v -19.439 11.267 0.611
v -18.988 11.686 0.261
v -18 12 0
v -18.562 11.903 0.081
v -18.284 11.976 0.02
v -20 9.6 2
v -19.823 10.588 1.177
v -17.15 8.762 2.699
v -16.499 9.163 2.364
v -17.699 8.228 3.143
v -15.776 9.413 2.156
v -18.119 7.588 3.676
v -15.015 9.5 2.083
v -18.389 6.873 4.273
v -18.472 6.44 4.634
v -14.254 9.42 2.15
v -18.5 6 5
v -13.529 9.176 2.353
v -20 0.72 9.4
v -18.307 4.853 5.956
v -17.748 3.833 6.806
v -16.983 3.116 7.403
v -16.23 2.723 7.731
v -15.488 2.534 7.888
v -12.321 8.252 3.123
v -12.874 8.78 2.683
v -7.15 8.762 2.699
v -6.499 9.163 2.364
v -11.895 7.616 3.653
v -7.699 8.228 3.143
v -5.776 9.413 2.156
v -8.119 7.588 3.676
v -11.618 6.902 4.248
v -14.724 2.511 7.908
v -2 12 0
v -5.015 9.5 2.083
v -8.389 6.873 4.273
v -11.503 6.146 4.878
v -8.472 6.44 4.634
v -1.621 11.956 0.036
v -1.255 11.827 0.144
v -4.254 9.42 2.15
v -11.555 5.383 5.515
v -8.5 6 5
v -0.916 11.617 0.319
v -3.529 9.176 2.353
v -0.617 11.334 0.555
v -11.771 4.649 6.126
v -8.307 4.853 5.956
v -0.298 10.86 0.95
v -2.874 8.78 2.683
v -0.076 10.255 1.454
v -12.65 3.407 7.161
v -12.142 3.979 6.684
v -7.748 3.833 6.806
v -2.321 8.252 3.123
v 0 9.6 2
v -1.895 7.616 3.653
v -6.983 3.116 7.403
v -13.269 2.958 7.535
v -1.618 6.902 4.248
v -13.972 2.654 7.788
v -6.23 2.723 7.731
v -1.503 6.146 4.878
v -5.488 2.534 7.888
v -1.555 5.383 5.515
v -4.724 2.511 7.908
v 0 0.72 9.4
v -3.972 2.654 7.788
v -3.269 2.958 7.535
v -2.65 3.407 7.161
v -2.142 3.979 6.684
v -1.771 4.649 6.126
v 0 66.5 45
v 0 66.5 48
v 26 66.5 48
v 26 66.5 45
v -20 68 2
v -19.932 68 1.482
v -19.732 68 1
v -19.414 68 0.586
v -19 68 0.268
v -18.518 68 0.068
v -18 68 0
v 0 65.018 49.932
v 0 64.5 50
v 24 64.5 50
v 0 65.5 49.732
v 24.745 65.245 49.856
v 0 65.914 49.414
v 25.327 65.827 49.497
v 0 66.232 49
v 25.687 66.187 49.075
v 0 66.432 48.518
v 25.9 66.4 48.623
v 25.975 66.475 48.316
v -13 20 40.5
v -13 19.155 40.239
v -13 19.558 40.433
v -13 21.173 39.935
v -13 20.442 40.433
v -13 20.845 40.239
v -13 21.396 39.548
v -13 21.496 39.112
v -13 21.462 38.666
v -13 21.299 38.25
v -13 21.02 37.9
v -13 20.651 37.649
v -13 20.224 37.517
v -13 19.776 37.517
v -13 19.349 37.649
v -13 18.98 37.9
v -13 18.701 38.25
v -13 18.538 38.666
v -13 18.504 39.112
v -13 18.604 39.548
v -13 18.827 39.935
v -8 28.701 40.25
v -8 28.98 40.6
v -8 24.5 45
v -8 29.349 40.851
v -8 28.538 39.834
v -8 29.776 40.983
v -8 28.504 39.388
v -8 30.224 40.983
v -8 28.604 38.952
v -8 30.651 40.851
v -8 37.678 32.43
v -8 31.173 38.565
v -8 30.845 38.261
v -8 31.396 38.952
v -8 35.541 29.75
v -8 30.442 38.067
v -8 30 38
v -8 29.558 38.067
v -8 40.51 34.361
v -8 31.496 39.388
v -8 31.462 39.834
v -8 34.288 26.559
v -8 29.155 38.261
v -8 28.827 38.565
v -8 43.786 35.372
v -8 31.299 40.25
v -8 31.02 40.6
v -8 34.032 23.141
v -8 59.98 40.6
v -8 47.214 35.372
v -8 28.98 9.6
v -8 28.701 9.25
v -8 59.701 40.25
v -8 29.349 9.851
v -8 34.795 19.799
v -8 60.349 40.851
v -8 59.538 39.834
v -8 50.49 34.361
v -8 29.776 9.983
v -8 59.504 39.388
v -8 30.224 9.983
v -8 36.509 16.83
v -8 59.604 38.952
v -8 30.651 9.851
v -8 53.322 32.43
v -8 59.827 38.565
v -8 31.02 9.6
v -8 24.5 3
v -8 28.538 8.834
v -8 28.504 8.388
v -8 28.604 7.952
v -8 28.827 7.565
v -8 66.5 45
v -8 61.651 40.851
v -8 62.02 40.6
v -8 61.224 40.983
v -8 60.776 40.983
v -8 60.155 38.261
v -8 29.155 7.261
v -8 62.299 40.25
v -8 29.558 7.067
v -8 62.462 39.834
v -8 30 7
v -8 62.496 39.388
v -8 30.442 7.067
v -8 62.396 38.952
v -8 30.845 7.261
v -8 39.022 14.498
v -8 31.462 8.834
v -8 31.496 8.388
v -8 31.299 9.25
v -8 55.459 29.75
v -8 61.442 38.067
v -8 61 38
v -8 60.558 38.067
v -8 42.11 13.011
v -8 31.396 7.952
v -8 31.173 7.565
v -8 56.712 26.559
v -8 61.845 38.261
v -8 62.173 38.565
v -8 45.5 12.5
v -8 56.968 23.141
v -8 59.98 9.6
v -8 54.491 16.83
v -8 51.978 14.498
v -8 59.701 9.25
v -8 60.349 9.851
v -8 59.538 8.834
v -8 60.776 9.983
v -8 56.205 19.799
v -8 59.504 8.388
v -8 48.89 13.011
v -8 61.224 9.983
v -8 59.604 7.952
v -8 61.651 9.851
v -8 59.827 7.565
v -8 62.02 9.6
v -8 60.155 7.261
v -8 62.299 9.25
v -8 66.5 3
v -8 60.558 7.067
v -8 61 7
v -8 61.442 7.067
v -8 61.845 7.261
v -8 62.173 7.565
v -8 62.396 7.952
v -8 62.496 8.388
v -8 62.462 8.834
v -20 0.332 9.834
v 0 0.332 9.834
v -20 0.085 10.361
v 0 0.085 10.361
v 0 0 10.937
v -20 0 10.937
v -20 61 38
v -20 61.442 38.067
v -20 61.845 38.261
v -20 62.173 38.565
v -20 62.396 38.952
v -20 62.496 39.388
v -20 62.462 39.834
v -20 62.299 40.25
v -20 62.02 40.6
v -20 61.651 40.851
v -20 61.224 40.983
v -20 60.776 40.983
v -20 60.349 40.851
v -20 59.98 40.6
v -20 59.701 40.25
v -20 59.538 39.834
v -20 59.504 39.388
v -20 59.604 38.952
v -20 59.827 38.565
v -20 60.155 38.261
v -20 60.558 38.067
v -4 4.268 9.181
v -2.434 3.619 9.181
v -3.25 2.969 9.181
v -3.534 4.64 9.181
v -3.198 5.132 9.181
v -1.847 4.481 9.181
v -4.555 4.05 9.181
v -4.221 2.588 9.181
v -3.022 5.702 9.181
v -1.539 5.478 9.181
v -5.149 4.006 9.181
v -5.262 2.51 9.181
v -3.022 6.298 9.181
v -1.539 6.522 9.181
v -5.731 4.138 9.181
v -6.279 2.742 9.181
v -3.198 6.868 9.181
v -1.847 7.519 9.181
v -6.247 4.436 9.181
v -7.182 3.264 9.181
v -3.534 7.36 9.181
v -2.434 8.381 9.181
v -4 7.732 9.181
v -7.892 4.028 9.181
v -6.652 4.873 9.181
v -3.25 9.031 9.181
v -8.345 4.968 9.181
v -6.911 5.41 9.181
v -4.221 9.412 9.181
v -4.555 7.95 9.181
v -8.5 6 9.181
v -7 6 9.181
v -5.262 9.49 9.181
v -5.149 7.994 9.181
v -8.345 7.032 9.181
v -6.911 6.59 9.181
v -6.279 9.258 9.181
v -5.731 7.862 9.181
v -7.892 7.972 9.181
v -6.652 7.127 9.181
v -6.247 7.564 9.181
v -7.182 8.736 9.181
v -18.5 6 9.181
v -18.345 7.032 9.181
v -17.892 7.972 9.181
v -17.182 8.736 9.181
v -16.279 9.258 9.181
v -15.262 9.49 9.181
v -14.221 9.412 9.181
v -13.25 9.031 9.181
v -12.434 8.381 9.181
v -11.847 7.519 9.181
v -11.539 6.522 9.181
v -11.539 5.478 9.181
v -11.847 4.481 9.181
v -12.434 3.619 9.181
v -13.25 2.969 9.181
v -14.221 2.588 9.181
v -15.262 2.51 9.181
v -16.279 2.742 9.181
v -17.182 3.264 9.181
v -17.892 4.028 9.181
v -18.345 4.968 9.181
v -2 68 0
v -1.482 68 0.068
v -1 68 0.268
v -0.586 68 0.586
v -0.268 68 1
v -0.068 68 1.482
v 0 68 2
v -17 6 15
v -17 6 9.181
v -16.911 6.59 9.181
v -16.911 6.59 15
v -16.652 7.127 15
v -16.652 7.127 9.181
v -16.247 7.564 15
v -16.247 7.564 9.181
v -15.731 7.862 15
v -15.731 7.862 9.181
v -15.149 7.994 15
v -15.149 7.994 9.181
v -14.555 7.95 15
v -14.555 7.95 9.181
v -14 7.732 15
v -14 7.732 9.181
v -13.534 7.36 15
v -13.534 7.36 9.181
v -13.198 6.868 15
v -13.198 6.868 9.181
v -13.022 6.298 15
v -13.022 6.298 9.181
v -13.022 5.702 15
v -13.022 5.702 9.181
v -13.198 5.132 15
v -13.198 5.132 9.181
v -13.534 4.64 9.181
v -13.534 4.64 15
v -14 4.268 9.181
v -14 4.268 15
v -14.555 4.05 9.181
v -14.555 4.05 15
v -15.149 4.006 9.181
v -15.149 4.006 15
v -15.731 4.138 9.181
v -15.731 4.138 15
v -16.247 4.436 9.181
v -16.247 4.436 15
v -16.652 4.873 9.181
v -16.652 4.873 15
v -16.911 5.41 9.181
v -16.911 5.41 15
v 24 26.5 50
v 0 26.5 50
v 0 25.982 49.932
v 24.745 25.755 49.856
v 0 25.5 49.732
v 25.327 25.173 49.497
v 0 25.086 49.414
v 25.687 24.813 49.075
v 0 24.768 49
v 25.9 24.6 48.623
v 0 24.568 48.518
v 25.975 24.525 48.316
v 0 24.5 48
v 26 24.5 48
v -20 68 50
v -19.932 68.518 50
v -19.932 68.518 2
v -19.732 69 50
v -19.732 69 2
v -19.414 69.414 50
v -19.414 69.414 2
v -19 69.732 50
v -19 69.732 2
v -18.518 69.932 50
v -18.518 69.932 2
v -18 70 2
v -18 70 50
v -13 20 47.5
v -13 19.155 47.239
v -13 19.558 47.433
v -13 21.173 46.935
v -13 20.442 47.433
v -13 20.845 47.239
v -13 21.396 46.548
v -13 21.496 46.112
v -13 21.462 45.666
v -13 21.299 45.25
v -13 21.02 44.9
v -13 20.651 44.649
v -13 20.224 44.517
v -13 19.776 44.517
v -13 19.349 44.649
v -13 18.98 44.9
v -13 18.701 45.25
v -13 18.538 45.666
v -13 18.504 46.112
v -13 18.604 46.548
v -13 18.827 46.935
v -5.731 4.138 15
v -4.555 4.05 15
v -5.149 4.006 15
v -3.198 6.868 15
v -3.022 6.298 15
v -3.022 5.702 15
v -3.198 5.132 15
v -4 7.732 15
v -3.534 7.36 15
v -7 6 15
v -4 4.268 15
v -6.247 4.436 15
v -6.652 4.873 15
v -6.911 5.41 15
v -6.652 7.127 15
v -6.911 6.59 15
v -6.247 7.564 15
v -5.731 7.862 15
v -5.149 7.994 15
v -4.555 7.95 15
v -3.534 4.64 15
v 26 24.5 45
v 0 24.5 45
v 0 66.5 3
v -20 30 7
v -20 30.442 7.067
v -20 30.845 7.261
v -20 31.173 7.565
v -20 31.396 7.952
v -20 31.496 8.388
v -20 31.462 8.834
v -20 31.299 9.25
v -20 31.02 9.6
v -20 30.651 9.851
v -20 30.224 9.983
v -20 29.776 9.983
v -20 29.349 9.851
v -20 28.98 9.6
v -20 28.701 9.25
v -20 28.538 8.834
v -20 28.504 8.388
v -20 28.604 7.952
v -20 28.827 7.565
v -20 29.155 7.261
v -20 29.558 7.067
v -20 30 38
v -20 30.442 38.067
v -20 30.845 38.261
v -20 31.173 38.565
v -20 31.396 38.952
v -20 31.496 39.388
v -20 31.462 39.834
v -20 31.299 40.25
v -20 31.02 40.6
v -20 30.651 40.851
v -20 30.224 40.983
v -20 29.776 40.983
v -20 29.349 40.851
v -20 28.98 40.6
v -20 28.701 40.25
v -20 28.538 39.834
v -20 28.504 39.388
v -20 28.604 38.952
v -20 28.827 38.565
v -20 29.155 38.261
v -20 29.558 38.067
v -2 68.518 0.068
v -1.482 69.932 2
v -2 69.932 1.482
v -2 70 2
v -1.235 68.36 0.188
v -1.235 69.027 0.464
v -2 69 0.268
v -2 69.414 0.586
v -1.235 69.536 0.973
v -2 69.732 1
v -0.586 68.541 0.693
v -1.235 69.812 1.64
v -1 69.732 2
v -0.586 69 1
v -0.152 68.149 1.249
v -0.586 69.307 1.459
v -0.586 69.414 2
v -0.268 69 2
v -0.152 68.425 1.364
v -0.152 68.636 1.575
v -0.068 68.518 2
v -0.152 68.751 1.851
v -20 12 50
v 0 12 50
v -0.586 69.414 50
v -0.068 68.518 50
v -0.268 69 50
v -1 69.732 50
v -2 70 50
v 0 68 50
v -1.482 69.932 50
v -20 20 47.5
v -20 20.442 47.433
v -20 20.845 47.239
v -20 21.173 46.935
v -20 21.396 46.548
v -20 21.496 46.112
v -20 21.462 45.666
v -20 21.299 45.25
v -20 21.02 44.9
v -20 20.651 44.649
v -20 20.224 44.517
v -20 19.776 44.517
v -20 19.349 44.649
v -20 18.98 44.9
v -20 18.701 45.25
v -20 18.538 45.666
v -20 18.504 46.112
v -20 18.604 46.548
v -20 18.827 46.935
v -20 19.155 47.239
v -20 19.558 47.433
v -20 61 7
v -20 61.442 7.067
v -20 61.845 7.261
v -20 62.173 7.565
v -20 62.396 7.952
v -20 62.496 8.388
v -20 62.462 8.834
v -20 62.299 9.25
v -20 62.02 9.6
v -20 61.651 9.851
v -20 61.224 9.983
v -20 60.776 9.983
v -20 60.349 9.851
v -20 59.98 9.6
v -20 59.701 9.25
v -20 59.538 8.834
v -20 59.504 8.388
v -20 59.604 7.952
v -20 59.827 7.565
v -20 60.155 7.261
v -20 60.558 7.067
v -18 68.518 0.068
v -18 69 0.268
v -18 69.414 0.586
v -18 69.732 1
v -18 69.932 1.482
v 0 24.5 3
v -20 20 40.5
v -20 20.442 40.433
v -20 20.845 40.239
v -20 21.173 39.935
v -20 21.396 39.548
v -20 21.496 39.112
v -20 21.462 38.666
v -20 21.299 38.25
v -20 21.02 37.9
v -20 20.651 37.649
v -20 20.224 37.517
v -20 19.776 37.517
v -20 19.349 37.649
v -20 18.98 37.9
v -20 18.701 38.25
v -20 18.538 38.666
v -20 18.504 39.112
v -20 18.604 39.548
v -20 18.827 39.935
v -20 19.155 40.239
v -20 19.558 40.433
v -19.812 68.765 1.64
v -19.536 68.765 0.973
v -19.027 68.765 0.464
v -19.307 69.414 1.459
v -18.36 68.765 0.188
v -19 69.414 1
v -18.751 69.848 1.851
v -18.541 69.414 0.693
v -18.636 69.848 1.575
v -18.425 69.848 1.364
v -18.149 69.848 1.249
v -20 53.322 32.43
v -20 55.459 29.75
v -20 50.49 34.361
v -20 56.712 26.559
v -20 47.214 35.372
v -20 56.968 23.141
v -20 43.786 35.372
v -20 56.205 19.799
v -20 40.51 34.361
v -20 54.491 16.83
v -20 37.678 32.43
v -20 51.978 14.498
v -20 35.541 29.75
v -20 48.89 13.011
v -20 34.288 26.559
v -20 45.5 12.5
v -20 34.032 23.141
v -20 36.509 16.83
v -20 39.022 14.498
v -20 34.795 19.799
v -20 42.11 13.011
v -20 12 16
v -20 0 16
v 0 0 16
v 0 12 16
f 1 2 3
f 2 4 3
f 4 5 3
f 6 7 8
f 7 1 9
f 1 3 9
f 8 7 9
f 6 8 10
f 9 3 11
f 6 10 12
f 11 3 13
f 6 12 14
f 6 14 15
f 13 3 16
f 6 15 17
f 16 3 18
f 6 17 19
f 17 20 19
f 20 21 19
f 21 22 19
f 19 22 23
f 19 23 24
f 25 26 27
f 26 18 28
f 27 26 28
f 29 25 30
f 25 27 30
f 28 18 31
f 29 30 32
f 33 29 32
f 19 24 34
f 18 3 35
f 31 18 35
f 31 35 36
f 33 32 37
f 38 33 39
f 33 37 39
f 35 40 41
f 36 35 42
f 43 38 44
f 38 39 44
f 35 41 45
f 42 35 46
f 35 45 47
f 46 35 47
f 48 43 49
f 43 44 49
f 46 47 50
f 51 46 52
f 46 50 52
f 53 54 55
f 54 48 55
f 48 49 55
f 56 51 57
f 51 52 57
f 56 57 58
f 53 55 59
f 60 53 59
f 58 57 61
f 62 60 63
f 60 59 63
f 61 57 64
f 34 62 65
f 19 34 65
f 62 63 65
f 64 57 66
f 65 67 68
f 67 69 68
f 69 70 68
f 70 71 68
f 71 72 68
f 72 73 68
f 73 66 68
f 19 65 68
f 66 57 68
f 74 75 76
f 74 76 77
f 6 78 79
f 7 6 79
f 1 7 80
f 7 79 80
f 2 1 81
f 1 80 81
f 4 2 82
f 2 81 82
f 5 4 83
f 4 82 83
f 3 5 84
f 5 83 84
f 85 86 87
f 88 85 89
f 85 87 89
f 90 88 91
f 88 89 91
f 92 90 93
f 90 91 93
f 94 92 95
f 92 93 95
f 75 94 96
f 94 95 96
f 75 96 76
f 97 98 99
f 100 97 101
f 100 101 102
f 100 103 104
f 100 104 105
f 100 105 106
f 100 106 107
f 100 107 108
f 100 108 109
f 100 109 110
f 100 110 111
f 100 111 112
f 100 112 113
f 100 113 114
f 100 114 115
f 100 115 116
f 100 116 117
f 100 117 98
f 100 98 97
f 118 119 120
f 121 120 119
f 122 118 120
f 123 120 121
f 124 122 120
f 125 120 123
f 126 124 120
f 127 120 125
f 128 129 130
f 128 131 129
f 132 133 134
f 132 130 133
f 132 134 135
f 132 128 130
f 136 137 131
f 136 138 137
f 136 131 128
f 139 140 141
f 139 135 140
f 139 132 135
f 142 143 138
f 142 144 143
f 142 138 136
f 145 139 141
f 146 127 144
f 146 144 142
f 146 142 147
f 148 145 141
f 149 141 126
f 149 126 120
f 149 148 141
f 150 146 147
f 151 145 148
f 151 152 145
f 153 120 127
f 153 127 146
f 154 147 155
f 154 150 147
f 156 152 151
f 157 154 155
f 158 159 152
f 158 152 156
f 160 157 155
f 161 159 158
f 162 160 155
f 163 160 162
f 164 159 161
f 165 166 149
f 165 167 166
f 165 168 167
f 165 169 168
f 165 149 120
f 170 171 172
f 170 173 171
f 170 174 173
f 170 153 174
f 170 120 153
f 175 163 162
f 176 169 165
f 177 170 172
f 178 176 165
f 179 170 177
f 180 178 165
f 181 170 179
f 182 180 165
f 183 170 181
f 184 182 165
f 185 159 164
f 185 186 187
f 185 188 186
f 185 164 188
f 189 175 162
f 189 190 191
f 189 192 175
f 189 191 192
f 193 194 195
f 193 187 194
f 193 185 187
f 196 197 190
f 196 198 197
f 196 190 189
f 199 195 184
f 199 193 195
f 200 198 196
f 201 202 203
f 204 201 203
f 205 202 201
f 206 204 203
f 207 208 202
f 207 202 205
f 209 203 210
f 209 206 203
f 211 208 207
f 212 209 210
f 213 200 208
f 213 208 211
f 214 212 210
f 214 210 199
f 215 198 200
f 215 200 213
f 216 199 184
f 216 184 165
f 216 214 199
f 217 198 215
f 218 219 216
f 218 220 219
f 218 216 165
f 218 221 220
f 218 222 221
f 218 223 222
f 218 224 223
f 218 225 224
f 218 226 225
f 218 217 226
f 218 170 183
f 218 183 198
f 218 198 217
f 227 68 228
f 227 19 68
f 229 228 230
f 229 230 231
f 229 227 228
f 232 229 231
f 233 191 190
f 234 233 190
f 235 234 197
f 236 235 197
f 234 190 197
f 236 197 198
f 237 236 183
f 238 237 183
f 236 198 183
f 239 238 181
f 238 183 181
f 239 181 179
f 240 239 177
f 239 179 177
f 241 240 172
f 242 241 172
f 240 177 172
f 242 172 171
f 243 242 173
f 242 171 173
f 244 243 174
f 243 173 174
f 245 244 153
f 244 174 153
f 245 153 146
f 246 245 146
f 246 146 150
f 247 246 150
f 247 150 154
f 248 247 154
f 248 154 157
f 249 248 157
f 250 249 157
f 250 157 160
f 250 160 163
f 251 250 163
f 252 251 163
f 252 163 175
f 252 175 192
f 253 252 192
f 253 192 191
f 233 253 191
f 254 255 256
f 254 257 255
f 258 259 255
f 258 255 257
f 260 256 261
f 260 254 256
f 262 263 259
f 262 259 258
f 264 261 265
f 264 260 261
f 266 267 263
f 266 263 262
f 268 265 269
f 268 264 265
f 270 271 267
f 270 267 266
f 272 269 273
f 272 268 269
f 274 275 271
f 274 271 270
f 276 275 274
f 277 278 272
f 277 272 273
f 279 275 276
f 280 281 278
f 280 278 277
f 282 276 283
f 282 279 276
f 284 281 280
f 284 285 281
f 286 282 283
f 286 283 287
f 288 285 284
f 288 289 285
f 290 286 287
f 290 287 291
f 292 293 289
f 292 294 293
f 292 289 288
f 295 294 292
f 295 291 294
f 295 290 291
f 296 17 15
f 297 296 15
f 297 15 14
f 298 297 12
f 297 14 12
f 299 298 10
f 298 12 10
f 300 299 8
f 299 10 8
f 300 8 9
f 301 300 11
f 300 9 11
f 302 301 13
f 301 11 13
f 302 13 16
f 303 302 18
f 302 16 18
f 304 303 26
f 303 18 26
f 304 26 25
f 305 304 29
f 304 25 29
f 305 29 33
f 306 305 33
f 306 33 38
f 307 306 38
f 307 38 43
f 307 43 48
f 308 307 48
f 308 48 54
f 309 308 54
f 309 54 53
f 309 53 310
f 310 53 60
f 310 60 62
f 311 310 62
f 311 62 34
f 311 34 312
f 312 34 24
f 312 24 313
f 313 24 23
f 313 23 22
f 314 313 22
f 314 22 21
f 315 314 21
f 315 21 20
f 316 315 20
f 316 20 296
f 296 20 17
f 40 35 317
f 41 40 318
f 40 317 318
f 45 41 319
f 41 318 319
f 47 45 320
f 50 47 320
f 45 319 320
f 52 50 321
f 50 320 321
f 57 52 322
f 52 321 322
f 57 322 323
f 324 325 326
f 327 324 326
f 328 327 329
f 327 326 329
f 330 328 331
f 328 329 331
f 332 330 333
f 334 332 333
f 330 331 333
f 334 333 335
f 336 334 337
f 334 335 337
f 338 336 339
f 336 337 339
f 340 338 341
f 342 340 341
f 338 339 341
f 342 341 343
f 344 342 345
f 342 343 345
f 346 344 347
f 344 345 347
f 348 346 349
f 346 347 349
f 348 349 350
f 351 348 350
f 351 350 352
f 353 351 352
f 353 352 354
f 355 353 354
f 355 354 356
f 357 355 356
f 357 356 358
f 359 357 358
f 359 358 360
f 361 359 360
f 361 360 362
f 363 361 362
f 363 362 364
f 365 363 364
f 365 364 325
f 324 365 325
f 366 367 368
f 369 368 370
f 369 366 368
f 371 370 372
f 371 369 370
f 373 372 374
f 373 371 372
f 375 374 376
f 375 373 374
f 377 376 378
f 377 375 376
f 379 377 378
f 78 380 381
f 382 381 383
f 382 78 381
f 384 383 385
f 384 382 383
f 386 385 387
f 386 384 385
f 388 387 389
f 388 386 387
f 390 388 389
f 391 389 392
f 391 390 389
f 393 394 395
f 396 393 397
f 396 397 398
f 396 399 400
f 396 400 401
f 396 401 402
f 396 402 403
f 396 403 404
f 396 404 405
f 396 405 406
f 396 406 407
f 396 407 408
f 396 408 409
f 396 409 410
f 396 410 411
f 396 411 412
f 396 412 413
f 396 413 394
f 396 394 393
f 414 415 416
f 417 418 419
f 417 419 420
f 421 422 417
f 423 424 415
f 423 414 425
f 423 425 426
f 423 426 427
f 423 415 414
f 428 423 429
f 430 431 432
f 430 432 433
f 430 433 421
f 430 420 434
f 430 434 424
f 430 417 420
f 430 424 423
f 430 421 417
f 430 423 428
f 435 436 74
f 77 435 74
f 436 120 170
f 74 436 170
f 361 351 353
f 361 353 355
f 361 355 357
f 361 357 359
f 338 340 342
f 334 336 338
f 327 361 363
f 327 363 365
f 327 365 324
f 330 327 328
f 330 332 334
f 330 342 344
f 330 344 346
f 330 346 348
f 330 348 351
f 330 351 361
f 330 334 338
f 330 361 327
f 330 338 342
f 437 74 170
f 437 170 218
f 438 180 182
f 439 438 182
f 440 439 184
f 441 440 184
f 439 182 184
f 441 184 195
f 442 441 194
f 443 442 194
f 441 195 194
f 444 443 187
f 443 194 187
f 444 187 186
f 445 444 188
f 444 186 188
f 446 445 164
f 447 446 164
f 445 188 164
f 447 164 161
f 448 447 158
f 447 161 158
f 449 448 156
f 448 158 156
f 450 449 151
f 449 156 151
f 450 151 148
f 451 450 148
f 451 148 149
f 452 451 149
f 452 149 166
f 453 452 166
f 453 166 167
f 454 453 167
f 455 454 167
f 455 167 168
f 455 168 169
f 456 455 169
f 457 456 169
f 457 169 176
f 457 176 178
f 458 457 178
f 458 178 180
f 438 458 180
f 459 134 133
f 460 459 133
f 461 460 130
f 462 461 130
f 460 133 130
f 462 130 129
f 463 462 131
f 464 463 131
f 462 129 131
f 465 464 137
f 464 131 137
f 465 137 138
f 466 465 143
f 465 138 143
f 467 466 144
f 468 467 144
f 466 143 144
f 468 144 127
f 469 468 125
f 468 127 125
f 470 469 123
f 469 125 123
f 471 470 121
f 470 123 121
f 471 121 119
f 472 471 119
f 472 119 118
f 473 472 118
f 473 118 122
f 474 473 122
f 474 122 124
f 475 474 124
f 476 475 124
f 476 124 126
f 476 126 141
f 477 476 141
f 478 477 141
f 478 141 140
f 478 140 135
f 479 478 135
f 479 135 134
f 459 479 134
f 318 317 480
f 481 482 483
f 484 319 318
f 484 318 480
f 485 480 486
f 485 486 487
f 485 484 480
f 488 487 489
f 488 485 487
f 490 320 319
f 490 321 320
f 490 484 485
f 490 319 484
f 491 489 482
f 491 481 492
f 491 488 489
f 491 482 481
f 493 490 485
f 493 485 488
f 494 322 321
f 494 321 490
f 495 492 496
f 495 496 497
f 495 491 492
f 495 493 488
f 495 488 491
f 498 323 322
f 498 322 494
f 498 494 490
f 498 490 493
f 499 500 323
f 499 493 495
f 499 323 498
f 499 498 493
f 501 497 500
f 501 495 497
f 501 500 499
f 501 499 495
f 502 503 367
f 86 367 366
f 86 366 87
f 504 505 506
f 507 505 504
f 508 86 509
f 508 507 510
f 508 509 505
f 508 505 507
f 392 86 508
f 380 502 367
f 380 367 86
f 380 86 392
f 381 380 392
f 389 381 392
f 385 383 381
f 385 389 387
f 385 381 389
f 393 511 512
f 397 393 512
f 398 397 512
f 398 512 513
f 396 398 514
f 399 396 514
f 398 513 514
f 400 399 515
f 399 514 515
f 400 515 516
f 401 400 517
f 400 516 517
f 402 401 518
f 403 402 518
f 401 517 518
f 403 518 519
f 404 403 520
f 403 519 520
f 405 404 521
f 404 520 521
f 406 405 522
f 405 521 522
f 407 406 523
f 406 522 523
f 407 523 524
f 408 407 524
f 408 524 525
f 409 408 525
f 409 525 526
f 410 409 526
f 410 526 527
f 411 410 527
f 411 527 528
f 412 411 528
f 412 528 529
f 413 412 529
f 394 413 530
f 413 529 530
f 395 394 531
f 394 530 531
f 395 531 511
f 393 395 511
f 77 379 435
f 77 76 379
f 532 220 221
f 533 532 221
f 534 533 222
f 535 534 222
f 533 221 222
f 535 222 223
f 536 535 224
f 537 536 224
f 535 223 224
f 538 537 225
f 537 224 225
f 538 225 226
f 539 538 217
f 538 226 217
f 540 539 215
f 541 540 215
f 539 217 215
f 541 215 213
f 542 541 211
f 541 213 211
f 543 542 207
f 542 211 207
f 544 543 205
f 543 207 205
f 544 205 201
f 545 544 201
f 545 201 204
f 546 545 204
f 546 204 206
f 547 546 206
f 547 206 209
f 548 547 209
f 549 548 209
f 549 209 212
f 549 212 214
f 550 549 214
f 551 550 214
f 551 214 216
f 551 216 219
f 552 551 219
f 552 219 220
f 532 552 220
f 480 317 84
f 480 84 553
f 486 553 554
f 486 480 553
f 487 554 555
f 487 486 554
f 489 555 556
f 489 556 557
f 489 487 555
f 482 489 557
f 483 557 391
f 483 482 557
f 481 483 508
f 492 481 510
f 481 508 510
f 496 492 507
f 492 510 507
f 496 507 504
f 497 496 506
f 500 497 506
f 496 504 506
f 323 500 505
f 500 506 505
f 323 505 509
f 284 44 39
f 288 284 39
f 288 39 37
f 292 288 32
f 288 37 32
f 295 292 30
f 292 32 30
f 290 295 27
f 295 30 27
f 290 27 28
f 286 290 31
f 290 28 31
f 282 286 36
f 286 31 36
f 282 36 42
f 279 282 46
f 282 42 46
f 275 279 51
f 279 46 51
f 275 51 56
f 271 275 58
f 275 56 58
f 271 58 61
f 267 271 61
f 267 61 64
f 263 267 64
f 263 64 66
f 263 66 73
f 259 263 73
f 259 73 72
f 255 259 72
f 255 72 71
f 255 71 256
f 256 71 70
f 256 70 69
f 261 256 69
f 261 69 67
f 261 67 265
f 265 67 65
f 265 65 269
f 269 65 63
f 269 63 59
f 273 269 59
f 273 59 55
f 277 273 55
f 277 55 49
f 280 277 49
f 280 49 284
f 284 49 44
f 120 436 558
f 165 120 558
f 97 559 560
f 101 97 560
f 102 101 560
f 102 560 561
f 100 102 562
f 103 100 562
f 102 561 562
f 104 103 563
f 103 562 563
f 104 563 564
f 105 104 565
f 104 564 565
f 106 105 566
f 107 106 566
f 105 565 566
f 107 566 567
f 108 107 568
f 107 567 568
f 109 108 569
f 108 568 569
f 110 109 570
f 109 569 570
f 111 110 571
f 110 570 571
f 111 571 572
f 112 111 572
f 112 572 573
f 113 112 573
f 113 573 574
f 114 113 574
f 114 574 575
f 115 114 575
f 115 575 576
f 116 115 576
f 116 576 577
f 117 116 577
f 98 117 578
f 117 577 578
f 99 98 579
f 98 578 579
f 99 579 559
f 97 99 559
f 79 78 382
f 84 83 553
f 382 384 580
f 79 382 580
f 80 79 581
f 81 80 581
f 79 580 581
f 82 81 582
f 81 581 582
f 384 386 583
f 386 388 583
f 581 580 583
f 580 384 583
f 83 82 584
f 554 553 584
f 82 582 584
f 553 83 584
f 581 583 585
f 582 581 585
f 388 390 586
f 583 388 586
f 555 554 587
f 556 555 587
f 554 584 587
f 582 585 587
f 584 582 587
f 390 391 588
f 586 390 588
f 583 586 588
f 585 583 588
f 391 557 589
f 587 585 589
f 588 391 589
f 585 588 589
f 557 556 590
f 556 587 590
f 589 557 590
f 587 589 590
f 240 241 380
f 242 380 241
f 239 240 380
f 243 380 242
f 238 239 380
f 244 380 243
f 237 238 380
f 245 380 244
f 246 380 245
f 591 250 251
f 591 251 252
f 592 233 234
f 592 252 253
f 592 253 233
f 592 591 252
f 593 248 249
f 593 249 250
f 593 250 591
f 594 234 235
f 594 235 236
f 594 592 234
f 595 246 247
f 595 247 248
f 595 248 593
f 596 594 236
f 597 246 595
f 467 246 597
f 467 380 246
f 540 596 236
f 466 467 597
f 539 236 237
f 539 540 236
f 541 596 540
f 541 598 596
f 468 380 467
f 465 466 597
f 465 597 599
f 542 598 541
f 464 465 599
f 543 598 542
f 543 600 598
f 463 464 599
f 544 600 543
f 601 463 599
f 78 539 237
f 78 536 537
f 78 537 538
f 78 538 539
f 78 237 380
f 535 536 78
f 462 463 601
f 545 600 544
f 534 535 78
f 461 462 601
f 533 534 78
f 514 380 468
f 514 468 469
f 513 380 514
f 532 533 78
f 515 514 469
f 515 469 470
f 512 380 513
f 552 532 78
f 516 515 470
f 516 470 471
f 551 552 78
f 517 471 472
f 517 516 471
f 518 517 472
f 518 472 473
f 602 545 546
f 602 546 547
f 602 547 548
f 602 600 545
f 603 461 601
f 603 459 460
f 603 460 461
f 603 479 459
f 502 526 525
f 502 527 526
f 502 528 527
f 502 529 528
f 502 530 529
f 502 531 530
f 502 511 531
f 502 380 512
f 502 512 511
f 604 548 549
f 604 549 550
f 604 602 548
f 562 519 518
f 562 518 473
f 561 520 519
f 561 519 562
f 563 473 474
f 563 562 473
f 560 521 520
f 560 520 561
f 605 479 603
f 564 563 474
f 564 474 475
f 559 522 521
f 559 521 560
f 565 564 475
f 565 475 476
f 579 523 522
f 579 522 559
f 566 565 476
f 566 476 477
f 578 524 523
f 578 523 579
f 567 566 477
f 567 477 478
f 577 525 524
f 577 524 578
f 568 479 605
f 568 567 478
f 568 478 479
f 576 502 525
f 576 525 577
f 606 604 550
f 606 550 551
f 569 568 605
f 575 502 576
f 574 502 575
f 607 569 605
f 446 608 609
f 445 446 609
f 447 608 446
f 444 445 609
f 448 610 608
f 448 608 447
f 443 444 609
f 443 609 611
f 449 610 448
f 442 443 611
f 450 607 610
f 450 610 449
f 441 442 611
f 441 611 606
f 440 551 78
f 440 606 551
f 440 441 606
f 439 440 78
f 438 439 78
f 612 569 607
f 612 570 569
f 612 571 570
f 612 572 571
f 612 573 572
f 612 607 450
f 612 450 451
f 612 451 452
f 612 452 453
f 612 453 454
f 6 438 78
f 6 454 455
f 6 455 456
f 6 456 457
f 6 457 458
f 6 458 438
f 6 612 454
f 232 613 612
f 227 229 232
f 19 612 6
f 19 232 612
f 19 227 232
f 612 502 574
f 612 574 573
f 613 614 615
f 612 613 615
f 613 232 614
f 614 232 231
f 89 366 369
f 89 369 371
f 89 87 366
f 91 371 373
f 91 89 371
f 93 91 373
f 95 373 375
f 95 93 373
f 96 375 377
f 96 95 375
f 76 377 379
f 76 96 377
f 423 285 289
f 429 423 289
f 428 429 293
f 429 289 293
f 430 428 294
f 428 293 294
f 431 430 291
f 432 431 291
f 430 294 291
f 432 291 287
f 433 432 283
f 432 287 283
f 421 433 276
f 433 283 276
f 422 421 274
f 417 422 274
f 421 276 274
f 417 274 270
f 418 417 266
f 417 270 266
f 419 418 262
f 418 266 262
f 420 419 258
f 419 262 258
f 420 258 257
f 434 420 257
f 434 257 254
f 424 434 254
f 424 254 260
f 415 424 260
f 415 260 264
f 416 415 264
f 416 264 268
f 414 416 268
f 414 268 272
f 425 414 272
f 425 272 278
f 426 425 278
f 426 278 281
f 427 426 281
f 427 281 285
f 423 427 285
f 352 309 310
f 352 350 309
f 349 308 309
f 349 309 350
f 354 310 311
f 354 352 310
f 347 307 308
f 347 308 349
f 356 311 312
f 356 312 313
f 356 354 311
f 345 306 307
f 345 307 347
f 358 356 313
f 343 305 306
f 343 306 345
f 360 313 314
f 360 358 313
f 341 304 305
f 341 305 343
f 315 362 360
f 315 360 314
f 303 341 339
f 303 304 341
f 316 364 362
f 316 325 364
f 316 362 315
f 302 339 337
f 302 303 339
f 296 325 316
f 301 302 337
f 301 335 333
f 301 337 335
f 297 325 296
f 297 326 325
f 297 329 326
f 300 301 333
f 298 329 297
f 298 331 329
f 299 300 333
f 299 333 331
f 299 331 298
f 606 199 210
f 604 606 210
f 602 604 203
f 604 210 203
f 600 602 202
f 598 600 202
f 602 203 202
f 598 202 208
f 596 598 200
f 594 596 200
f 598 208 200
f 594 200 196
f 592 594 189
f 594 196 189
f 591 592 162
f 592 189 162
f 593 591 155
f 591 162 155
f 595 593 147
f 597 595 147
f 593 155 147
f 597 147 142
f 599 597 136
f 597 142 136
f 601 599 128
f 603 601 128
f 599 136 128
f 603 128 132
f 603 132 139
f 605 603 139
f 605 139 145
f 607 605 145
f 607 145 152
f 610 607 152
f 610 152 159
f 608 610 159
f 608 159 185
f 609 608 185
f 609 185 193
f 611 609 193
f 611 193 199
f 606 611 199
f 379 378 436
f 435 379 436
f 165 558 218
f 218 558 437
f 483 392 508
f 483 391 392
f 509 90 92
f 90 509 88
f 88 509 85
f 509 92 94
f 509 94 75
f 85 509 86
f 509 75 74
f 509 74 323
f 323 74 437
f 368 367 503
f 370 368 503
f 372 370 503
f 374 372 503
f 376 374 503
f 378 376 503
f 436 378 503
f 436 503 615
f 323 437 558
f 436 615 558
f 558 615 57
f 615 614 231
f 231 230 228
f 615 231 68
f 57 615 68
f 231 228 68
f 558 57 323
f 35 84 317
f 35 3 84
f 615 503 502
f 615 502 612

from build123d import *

# Parameters (mm, degrees)
SKETCH1_W           = 20
SKETCH1_H           = 50
BOSS_EXTRUDE1_DEPTH = 70
SKETCH2_R           = 1.5
SKETCH2_R_2         = 11.5
CUT_EXTRUDE2_DEPTH  = 60
SKETCH4_W           = 34
SKETCH4_H           = 12
CUT_EXTRUDE3_DEPTH  = 60
SKETCH8_R           = 2
CUT_EXTRUDE5_DEPTH  = 15
SKETCH9_W           = 42
SKETCH9_H           = 42
CUT_EXTRUDE6_DEPTH  = 8
CUT_EXTRUDE8_DEPTH  = 30
SKETCH17_R          = 3.5
CUT_EXTRUDE13_DEPTH = 9.18109305
SKETCH18_R          = 1.5
CUT_EXTRUDE14_DEPTH = 7
FILLET1_R           = 2
FILLET2_R           = 2
FILLET3_R           = 2
FILLET4_R           = 2
SKETCH19_W          = 5
SKETCH19_H          = 42
BOSS_EXTRUDE2_DEPTH = 26
FILLET6_R           = 2


with BuildPart() as part:
    # Sketch1 → Boss-Extrude1 (new body)
    with BuildSketch(Plane(origin=(0, 0, 0), x_dir=(1, 0, 0), z_dir=(0, 1, 0))):
        with Locations((-10, -25)):
            Rectangle(SKETCH1_W, SKETCH1_H)
    extrude(amount=BOSS_EXTRUDE1_DEPTH)

    # Sketch2 → Cut-Extrude2 (cut)
    with BuildSketch(Plane(origin=(0, 0, 0), x_dir=(0, 0, -1), z_dir=(1, 0, 0))):
        with Locations((-8.5, 61)):
            Circle(SKETCH2_R)
        with Locations((-24, 45.5)):
            Circle(SKETCH2_R_2)
        with Locations((-8.5, 30)):
            Circle(SKETCH2_R)
        with Locations((-39.5, 30)):
            Circle(SKETCH2_R)
        with Locations((-39.5, 61)):
            Circle(SKETCH2_R)
    extrude(amount=-CUT_EXTRUDE2_DEPTH, mode=Mode.SUBTRACT)

    # Sketch4 → Cut-Extrude3 (cut)
    with BuildSketch(Plane(origin=(0, 0, 0), x_dir=(0, 0, -1), z_dir=(1, 0, 0))):
        with Locations((-33, 6)):
            Rectangle(SKETCH4_W, SKETCH4_H)
    extrude(amount=-CUT_EXTRUDE3_DEPTH, mode=Mode.SUBTRACT)

    # Sketch8 → Cut-Extrude5 (cut)
    with BuildSketch(Plane(origin=(0, 0, 0), x_dir=(-1, 0, 0), z_dir=(0, 0, -1))):
        with Locations((15, 6)):
            Circle(SKETCH8_R)
        with Locations((5, 6)):
            Circle(SKETCH8_R)
    extrude(amount=-CUT_EXTRUDE5_DEPTH, mode=Mode.SUBTRACT)

    # Sketch9 → Cut-Extrude6 (cut)
    with BuildSketch(Plane(origin=(0, 0, 0), x_dir=(0, 0, -1), z_dir=(1, 0, 0))):
        with Locations((-24, 45.5)):
            Rectangle(SKETCH9_W, SKETCH9_H)
    extrude(amount=-CUT_EXTRUDE6_DEPTH, mode=Mode.SUBTRACT)

    # Sketch11 → Cut-Extrude8 (cut)
    with BuildSketch(Plane(origin=(0, 0, 0), x_dir=(0, 0, -1), z_dir=(1, 0, 0))):
        Polygon((-10, 0), (0, 0), (0, 12), align=None)
    extrude(amount=-CUT_EXTRUDE8_DEPTH, mode=Mode.SUBTRACT)

    # Sketch17 → Cut-Extrude13 (cut)
    with BuildSketch(Plane(origin=(0, 0, 0), x_dir=(-1, 0, 0), z_dir=(0, 0, -1))):
        with Locations((15, 6)):
            Circle(SKETCH17_R)
        with Locations((5, 6)):
            Circle(SKETCH17_R)
    extrude(amount=-CUT_EXTRUDE13_DEPTH, mode=Mode.SUBTRACT)

    # Sketch18 → Cut-Extrude14 (cut)
    with BuildSketch(Plane.ZY.offset(20)):
        with Locations((46, 20)):
            Circle(SKETCH18_R)
        with Locations((39, 20)):
            Circle(SKETCH18_R)
    extrude(amount=-CUT_EXTRUDE14_DEPTH, mode=Mode.SUBTRACT)

    # Fillet1
    fillet1_edges = [part.edges().sort_by_distance(p)[0] for p in [
        (-20, 41, 0),
    ]]
    fillet(fillet1_edges, radius=FILLET1_R)

    # Fillet2
    fillet2_edges = [part.edges().sort_by_distance(p)[0] for p in [
        (-20, 70, 26),
        (-19.414213562, 70, 0.585786438),
        (-9, 70, 0),
    ]]
    fillet(fillet2_edges, radius=FILLET2_R)

    # Fillet3
    fillet3_edges = [part.edges().sort_by_distance(p)[0] for p in [
        (0, 40, 0),
        (0, 69.414213562, 0.585786438),
        (0, 70, 26),
    ]]
    fillet(fillet3_edges, radius=FILLET3_R)

    # Fillet4
    fillet4_edges = [part.edges().sort_by_distance(p)[0] for p in [
        (-10, 0, 10),
    ]]
    fillet(fillet4_edges, radius=FILLET4_R)

    # Sketch19 → Boss-Extrude2 (add)
    with BuildSketch(Plane(origin=(0, 0, 0), x_dir=(0, 0, -1), z_dir=(1, 0, 0))):
        with Locations((-47.5, 45.5)):
            Rectangle(SKETCH19_W, SKETCH19_H)
    extrude(amount=BOSS_EXTRUDE2_DEPTH)

    # Fillet6
    fillet6_edges = [part.edges().sort_by_distance(p)[0] for p in [
        (13, 66.5, 50),
        (13, 24.5, 50),
        (26, 45.5, 50),
    ]]
    fillet(fillet6_edges, radius=FILLET6_R)


solid = part.part
